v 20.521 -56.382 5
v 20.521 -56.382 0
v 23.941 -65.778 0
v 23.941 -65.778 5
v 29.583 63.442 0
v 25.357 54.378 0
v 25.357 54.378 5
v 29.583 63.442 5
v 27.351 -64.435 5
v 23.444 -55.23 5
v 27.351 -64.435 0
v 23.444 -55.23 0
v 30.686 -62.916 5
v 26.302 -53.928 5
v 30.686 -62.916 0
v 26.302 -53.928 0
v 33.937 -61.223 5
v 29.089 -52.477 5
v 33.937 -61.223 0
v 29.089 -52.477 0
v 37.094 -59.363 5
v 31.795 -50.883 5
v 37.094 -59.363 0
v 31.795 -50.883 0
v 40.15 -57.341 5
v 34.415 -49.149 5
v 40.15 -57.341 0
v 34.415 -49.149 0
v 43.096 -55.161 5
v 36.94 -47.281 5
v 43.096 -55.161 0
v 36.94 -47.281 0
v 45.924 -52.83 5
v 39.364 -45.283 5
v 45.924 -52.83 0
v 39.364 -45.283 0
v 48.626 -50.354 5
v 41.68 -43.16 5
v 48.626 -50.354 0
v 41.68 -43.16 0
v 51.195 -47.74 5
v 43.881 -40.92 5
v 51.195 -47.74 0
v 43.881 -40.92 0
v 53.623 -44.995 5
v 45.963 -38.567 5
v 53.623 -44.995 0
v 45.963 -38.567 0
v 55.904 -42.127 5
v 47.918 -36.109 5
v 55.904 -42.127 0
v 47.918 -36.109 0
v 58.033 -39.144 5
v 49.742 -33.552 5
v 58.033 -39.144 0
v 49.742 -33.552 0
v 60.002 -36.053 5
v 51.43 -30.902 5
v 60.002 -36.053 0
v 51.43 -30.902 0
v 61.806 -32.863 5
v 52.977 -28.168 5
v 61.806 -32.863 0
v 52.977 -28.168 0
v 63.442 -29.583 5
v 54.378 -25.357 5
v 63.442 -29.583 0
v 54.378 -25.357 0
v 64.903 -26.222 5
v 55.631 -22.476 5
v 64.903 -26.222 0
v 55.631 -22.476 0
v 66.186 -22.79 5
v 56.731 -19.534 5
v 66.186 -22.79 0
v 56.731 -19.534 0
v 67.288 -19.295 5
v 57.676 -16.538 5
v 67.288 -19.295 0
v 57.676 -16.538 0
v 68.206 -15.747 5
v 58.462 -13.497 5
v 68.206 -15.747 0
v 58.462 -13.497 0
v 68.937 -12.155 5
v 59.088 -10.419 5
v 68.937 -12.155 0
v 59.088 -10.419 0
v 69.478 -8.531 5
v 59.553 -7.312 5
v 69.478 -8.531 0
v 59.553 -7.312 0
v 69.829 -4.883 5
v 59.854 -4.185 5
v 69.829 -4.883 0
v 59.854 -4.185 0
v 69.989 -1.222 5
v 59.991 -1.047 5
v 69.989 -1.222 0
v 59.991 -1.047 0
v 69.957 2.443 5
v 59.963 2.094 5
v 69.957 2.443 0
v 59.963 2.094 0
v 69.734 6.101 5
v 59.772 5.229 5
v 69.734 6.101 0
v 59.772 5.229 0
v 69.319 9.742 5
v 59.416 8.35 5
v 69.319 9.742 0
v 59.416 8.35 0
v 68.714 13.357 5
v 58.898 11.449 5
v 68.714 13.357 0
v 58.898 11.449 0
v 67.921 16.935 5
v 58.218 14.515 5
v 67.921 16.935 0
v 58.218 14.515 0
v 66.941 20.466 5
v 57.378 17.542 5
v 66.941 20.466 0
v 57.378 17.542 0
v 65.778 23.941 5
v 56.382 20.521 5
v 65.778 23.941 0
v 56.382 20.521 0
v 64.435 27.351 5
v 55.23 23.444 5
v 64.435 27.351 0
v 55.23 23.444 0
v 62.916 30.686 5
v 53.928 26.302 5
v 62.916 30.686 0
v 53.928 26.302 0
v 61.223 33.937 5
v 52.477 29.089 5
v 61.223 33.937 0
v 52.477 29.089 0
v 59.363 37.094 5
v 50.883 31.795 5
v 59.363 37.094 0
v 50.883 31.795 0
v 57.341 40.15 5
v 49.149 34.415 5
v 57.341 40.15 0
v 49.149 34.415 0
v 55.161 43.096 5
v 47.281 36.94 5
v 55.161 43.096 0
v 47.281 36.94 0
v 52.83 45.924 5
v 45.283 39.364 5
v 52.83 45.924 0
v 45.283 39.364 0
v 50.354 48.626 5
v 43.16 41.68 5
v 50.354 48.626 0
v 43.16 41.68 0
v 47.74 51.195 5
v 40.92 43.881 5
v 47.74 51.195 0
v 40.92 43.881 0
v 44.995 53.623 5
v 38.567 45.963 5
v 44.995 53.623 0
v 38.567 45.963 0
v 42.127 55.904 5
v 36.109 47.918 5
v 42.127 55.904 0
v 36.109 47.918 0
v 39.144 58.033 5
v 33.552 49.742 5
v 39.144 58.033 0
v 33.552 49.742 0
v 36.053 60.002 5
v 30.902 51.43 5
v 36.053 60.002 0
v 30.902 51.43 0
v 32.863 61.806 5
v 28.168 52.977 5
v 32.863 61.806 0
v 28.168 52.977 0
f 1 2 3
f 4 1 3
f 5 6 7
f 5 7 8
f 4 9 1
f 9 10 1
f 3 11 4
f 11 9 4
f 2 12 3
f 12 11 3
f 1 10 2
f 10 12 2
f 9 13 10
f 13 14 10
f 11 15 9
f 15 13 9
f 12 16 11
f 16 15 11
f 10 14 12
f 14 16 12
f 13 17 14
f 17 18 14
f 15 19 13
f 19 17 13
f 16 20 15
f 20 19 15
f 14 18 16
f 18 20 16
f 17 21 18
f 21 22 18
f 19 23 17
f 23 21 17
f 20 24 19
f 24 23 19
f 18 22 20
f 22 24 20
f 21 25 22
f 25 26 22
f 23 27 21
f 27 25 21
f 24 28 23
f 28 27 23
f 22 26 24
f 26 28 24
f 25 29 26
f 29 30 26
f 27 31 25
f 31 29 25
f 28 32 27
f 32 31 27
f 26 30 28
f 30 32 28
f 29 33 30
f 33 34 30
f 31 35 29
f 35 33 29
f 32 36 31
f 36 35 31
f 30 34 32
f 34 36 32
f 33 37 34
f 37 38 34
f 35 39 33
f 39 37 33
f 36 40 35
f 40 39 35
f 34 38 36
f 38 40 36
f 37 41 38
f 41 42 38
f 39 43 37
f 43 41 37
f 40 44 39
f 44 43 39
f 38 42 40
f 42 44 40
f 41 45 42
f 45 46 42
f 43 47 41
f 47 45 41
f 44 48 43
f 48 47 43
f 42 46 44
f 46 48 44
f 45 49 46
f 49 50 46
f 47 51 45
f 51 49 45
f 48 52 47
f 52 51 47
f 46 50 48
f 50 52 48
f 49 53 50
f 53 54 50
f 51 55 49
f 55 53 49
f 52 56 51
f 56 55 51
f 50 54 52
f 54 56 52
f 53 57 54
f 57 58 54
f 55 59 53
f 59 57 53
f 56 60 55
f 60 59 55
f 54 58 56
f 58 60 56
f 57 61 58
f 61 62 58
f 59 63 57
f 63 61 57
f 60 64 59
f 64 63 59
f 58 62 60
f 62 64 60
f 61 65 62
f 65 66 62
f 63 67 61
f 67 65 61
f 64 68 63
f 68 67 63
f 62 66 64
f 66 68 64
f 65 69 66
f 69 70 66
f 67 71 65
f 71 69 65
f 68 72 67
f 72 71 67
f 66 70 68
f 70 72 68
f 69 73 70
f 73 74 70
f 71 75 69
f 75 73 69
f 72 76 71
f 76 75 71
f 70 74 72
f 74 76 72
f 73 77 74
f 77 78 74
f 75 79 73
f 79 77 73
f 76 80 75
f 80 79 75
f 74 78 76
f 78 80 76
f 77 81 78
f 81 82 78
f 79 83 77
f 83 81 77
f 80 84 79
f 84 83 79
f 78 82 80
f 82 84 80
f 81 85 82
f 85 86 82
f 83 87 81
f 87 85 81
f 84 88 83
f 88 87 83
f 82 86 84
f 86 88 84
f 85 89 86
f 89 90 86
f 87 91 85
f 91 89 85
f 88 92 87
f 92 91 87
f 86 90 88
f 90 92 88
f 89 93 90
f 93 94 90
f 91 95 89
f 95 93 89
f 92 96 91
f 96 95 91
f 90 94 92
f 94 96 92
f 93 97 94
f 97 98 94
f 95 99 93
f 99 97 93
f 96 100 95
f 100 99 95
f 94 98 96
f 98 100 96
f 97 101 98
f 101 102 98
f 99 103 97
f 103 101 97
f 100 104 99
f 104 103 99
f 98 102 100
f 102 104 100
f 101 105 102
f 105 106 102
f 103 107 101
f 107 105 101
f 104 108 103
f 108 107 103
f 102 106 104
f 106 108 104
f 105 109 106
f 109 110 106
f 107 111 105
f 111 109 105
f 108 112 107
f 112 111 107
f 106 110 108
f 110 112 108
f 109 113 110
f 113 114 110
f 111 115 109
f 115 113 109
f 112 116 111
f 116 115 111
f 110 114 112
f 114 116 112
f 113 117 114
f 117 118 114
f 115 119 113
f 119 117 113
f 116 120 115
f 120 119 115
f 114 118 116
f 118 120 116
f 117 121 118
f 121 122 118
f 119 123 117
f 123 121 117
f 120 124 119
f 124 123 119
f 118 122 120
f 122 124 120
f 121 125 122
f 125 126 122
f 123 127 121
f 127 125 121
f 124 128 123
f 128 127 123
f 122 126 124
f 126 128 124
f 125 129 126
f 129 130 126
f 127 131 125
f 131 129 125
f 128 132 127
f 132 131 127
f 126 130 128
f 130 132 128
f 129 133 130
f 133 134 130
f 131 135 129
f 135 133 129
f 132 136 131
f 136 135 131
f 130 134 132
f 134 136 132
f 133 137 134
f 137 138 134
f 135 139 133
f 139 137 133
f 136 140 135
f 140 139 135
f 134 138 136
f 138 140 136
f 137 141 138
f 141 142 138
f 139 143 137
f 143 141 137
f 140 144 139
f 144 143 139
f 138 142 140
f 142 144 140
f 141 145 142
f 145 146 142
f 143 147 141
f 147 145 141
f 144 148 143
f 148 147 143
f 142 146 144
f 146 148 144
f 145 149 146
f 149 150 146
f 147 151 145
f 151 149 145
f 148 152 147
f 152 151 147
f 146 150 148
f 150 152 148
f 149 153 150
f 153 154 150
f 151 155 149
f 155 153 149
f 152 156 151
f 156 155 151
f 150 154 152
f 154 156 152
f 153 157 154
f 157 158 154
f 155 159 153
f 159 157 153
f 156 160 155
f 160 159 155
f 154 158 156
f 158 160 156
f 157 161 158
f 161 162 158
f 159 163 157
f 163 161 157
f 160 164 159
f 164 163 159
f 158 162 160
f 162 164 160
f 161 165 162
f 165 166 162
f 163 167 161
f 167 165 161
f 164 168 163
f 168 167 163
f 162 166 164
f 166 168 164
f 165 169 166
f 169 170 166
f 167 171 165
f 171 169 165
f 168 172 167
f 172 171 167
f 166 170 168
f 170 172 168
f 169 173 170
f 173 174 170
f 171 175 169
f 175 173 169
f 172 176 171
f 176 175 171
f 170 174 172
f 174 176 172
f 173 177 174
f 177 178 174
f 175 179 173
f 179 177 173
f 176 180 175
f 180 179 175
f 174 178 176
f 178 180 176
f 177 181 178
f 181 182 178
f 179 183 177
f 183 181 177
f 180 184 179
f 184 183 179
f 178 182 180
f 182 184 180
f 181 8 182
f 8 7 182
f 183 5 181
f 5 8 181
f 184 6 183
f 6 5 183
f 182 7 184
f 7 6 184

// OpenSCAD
use <ioptron-ieq30pro.scad>

echo(version=version());

// Global resolution
// Don't generate smaller facets than this many mm.
$fs = 0.1;
// Don't generate larger angles than this many degrees.
$fa = 3;

ra1_radius = ra_cover_radius();

echo("ra1_radius", ra1_radius);

module RA_measurement() {
  color("blue")
    rotate([0,0, -70])
    rotate_extrude(angle=135)
        translate([ra1_radius, 0])
        	square([10,5]);
}

if ($preview) {
  ioptron_mount($t * 360) {
    RA_measurement();
  }
} else {
  RA_measurement();
}
